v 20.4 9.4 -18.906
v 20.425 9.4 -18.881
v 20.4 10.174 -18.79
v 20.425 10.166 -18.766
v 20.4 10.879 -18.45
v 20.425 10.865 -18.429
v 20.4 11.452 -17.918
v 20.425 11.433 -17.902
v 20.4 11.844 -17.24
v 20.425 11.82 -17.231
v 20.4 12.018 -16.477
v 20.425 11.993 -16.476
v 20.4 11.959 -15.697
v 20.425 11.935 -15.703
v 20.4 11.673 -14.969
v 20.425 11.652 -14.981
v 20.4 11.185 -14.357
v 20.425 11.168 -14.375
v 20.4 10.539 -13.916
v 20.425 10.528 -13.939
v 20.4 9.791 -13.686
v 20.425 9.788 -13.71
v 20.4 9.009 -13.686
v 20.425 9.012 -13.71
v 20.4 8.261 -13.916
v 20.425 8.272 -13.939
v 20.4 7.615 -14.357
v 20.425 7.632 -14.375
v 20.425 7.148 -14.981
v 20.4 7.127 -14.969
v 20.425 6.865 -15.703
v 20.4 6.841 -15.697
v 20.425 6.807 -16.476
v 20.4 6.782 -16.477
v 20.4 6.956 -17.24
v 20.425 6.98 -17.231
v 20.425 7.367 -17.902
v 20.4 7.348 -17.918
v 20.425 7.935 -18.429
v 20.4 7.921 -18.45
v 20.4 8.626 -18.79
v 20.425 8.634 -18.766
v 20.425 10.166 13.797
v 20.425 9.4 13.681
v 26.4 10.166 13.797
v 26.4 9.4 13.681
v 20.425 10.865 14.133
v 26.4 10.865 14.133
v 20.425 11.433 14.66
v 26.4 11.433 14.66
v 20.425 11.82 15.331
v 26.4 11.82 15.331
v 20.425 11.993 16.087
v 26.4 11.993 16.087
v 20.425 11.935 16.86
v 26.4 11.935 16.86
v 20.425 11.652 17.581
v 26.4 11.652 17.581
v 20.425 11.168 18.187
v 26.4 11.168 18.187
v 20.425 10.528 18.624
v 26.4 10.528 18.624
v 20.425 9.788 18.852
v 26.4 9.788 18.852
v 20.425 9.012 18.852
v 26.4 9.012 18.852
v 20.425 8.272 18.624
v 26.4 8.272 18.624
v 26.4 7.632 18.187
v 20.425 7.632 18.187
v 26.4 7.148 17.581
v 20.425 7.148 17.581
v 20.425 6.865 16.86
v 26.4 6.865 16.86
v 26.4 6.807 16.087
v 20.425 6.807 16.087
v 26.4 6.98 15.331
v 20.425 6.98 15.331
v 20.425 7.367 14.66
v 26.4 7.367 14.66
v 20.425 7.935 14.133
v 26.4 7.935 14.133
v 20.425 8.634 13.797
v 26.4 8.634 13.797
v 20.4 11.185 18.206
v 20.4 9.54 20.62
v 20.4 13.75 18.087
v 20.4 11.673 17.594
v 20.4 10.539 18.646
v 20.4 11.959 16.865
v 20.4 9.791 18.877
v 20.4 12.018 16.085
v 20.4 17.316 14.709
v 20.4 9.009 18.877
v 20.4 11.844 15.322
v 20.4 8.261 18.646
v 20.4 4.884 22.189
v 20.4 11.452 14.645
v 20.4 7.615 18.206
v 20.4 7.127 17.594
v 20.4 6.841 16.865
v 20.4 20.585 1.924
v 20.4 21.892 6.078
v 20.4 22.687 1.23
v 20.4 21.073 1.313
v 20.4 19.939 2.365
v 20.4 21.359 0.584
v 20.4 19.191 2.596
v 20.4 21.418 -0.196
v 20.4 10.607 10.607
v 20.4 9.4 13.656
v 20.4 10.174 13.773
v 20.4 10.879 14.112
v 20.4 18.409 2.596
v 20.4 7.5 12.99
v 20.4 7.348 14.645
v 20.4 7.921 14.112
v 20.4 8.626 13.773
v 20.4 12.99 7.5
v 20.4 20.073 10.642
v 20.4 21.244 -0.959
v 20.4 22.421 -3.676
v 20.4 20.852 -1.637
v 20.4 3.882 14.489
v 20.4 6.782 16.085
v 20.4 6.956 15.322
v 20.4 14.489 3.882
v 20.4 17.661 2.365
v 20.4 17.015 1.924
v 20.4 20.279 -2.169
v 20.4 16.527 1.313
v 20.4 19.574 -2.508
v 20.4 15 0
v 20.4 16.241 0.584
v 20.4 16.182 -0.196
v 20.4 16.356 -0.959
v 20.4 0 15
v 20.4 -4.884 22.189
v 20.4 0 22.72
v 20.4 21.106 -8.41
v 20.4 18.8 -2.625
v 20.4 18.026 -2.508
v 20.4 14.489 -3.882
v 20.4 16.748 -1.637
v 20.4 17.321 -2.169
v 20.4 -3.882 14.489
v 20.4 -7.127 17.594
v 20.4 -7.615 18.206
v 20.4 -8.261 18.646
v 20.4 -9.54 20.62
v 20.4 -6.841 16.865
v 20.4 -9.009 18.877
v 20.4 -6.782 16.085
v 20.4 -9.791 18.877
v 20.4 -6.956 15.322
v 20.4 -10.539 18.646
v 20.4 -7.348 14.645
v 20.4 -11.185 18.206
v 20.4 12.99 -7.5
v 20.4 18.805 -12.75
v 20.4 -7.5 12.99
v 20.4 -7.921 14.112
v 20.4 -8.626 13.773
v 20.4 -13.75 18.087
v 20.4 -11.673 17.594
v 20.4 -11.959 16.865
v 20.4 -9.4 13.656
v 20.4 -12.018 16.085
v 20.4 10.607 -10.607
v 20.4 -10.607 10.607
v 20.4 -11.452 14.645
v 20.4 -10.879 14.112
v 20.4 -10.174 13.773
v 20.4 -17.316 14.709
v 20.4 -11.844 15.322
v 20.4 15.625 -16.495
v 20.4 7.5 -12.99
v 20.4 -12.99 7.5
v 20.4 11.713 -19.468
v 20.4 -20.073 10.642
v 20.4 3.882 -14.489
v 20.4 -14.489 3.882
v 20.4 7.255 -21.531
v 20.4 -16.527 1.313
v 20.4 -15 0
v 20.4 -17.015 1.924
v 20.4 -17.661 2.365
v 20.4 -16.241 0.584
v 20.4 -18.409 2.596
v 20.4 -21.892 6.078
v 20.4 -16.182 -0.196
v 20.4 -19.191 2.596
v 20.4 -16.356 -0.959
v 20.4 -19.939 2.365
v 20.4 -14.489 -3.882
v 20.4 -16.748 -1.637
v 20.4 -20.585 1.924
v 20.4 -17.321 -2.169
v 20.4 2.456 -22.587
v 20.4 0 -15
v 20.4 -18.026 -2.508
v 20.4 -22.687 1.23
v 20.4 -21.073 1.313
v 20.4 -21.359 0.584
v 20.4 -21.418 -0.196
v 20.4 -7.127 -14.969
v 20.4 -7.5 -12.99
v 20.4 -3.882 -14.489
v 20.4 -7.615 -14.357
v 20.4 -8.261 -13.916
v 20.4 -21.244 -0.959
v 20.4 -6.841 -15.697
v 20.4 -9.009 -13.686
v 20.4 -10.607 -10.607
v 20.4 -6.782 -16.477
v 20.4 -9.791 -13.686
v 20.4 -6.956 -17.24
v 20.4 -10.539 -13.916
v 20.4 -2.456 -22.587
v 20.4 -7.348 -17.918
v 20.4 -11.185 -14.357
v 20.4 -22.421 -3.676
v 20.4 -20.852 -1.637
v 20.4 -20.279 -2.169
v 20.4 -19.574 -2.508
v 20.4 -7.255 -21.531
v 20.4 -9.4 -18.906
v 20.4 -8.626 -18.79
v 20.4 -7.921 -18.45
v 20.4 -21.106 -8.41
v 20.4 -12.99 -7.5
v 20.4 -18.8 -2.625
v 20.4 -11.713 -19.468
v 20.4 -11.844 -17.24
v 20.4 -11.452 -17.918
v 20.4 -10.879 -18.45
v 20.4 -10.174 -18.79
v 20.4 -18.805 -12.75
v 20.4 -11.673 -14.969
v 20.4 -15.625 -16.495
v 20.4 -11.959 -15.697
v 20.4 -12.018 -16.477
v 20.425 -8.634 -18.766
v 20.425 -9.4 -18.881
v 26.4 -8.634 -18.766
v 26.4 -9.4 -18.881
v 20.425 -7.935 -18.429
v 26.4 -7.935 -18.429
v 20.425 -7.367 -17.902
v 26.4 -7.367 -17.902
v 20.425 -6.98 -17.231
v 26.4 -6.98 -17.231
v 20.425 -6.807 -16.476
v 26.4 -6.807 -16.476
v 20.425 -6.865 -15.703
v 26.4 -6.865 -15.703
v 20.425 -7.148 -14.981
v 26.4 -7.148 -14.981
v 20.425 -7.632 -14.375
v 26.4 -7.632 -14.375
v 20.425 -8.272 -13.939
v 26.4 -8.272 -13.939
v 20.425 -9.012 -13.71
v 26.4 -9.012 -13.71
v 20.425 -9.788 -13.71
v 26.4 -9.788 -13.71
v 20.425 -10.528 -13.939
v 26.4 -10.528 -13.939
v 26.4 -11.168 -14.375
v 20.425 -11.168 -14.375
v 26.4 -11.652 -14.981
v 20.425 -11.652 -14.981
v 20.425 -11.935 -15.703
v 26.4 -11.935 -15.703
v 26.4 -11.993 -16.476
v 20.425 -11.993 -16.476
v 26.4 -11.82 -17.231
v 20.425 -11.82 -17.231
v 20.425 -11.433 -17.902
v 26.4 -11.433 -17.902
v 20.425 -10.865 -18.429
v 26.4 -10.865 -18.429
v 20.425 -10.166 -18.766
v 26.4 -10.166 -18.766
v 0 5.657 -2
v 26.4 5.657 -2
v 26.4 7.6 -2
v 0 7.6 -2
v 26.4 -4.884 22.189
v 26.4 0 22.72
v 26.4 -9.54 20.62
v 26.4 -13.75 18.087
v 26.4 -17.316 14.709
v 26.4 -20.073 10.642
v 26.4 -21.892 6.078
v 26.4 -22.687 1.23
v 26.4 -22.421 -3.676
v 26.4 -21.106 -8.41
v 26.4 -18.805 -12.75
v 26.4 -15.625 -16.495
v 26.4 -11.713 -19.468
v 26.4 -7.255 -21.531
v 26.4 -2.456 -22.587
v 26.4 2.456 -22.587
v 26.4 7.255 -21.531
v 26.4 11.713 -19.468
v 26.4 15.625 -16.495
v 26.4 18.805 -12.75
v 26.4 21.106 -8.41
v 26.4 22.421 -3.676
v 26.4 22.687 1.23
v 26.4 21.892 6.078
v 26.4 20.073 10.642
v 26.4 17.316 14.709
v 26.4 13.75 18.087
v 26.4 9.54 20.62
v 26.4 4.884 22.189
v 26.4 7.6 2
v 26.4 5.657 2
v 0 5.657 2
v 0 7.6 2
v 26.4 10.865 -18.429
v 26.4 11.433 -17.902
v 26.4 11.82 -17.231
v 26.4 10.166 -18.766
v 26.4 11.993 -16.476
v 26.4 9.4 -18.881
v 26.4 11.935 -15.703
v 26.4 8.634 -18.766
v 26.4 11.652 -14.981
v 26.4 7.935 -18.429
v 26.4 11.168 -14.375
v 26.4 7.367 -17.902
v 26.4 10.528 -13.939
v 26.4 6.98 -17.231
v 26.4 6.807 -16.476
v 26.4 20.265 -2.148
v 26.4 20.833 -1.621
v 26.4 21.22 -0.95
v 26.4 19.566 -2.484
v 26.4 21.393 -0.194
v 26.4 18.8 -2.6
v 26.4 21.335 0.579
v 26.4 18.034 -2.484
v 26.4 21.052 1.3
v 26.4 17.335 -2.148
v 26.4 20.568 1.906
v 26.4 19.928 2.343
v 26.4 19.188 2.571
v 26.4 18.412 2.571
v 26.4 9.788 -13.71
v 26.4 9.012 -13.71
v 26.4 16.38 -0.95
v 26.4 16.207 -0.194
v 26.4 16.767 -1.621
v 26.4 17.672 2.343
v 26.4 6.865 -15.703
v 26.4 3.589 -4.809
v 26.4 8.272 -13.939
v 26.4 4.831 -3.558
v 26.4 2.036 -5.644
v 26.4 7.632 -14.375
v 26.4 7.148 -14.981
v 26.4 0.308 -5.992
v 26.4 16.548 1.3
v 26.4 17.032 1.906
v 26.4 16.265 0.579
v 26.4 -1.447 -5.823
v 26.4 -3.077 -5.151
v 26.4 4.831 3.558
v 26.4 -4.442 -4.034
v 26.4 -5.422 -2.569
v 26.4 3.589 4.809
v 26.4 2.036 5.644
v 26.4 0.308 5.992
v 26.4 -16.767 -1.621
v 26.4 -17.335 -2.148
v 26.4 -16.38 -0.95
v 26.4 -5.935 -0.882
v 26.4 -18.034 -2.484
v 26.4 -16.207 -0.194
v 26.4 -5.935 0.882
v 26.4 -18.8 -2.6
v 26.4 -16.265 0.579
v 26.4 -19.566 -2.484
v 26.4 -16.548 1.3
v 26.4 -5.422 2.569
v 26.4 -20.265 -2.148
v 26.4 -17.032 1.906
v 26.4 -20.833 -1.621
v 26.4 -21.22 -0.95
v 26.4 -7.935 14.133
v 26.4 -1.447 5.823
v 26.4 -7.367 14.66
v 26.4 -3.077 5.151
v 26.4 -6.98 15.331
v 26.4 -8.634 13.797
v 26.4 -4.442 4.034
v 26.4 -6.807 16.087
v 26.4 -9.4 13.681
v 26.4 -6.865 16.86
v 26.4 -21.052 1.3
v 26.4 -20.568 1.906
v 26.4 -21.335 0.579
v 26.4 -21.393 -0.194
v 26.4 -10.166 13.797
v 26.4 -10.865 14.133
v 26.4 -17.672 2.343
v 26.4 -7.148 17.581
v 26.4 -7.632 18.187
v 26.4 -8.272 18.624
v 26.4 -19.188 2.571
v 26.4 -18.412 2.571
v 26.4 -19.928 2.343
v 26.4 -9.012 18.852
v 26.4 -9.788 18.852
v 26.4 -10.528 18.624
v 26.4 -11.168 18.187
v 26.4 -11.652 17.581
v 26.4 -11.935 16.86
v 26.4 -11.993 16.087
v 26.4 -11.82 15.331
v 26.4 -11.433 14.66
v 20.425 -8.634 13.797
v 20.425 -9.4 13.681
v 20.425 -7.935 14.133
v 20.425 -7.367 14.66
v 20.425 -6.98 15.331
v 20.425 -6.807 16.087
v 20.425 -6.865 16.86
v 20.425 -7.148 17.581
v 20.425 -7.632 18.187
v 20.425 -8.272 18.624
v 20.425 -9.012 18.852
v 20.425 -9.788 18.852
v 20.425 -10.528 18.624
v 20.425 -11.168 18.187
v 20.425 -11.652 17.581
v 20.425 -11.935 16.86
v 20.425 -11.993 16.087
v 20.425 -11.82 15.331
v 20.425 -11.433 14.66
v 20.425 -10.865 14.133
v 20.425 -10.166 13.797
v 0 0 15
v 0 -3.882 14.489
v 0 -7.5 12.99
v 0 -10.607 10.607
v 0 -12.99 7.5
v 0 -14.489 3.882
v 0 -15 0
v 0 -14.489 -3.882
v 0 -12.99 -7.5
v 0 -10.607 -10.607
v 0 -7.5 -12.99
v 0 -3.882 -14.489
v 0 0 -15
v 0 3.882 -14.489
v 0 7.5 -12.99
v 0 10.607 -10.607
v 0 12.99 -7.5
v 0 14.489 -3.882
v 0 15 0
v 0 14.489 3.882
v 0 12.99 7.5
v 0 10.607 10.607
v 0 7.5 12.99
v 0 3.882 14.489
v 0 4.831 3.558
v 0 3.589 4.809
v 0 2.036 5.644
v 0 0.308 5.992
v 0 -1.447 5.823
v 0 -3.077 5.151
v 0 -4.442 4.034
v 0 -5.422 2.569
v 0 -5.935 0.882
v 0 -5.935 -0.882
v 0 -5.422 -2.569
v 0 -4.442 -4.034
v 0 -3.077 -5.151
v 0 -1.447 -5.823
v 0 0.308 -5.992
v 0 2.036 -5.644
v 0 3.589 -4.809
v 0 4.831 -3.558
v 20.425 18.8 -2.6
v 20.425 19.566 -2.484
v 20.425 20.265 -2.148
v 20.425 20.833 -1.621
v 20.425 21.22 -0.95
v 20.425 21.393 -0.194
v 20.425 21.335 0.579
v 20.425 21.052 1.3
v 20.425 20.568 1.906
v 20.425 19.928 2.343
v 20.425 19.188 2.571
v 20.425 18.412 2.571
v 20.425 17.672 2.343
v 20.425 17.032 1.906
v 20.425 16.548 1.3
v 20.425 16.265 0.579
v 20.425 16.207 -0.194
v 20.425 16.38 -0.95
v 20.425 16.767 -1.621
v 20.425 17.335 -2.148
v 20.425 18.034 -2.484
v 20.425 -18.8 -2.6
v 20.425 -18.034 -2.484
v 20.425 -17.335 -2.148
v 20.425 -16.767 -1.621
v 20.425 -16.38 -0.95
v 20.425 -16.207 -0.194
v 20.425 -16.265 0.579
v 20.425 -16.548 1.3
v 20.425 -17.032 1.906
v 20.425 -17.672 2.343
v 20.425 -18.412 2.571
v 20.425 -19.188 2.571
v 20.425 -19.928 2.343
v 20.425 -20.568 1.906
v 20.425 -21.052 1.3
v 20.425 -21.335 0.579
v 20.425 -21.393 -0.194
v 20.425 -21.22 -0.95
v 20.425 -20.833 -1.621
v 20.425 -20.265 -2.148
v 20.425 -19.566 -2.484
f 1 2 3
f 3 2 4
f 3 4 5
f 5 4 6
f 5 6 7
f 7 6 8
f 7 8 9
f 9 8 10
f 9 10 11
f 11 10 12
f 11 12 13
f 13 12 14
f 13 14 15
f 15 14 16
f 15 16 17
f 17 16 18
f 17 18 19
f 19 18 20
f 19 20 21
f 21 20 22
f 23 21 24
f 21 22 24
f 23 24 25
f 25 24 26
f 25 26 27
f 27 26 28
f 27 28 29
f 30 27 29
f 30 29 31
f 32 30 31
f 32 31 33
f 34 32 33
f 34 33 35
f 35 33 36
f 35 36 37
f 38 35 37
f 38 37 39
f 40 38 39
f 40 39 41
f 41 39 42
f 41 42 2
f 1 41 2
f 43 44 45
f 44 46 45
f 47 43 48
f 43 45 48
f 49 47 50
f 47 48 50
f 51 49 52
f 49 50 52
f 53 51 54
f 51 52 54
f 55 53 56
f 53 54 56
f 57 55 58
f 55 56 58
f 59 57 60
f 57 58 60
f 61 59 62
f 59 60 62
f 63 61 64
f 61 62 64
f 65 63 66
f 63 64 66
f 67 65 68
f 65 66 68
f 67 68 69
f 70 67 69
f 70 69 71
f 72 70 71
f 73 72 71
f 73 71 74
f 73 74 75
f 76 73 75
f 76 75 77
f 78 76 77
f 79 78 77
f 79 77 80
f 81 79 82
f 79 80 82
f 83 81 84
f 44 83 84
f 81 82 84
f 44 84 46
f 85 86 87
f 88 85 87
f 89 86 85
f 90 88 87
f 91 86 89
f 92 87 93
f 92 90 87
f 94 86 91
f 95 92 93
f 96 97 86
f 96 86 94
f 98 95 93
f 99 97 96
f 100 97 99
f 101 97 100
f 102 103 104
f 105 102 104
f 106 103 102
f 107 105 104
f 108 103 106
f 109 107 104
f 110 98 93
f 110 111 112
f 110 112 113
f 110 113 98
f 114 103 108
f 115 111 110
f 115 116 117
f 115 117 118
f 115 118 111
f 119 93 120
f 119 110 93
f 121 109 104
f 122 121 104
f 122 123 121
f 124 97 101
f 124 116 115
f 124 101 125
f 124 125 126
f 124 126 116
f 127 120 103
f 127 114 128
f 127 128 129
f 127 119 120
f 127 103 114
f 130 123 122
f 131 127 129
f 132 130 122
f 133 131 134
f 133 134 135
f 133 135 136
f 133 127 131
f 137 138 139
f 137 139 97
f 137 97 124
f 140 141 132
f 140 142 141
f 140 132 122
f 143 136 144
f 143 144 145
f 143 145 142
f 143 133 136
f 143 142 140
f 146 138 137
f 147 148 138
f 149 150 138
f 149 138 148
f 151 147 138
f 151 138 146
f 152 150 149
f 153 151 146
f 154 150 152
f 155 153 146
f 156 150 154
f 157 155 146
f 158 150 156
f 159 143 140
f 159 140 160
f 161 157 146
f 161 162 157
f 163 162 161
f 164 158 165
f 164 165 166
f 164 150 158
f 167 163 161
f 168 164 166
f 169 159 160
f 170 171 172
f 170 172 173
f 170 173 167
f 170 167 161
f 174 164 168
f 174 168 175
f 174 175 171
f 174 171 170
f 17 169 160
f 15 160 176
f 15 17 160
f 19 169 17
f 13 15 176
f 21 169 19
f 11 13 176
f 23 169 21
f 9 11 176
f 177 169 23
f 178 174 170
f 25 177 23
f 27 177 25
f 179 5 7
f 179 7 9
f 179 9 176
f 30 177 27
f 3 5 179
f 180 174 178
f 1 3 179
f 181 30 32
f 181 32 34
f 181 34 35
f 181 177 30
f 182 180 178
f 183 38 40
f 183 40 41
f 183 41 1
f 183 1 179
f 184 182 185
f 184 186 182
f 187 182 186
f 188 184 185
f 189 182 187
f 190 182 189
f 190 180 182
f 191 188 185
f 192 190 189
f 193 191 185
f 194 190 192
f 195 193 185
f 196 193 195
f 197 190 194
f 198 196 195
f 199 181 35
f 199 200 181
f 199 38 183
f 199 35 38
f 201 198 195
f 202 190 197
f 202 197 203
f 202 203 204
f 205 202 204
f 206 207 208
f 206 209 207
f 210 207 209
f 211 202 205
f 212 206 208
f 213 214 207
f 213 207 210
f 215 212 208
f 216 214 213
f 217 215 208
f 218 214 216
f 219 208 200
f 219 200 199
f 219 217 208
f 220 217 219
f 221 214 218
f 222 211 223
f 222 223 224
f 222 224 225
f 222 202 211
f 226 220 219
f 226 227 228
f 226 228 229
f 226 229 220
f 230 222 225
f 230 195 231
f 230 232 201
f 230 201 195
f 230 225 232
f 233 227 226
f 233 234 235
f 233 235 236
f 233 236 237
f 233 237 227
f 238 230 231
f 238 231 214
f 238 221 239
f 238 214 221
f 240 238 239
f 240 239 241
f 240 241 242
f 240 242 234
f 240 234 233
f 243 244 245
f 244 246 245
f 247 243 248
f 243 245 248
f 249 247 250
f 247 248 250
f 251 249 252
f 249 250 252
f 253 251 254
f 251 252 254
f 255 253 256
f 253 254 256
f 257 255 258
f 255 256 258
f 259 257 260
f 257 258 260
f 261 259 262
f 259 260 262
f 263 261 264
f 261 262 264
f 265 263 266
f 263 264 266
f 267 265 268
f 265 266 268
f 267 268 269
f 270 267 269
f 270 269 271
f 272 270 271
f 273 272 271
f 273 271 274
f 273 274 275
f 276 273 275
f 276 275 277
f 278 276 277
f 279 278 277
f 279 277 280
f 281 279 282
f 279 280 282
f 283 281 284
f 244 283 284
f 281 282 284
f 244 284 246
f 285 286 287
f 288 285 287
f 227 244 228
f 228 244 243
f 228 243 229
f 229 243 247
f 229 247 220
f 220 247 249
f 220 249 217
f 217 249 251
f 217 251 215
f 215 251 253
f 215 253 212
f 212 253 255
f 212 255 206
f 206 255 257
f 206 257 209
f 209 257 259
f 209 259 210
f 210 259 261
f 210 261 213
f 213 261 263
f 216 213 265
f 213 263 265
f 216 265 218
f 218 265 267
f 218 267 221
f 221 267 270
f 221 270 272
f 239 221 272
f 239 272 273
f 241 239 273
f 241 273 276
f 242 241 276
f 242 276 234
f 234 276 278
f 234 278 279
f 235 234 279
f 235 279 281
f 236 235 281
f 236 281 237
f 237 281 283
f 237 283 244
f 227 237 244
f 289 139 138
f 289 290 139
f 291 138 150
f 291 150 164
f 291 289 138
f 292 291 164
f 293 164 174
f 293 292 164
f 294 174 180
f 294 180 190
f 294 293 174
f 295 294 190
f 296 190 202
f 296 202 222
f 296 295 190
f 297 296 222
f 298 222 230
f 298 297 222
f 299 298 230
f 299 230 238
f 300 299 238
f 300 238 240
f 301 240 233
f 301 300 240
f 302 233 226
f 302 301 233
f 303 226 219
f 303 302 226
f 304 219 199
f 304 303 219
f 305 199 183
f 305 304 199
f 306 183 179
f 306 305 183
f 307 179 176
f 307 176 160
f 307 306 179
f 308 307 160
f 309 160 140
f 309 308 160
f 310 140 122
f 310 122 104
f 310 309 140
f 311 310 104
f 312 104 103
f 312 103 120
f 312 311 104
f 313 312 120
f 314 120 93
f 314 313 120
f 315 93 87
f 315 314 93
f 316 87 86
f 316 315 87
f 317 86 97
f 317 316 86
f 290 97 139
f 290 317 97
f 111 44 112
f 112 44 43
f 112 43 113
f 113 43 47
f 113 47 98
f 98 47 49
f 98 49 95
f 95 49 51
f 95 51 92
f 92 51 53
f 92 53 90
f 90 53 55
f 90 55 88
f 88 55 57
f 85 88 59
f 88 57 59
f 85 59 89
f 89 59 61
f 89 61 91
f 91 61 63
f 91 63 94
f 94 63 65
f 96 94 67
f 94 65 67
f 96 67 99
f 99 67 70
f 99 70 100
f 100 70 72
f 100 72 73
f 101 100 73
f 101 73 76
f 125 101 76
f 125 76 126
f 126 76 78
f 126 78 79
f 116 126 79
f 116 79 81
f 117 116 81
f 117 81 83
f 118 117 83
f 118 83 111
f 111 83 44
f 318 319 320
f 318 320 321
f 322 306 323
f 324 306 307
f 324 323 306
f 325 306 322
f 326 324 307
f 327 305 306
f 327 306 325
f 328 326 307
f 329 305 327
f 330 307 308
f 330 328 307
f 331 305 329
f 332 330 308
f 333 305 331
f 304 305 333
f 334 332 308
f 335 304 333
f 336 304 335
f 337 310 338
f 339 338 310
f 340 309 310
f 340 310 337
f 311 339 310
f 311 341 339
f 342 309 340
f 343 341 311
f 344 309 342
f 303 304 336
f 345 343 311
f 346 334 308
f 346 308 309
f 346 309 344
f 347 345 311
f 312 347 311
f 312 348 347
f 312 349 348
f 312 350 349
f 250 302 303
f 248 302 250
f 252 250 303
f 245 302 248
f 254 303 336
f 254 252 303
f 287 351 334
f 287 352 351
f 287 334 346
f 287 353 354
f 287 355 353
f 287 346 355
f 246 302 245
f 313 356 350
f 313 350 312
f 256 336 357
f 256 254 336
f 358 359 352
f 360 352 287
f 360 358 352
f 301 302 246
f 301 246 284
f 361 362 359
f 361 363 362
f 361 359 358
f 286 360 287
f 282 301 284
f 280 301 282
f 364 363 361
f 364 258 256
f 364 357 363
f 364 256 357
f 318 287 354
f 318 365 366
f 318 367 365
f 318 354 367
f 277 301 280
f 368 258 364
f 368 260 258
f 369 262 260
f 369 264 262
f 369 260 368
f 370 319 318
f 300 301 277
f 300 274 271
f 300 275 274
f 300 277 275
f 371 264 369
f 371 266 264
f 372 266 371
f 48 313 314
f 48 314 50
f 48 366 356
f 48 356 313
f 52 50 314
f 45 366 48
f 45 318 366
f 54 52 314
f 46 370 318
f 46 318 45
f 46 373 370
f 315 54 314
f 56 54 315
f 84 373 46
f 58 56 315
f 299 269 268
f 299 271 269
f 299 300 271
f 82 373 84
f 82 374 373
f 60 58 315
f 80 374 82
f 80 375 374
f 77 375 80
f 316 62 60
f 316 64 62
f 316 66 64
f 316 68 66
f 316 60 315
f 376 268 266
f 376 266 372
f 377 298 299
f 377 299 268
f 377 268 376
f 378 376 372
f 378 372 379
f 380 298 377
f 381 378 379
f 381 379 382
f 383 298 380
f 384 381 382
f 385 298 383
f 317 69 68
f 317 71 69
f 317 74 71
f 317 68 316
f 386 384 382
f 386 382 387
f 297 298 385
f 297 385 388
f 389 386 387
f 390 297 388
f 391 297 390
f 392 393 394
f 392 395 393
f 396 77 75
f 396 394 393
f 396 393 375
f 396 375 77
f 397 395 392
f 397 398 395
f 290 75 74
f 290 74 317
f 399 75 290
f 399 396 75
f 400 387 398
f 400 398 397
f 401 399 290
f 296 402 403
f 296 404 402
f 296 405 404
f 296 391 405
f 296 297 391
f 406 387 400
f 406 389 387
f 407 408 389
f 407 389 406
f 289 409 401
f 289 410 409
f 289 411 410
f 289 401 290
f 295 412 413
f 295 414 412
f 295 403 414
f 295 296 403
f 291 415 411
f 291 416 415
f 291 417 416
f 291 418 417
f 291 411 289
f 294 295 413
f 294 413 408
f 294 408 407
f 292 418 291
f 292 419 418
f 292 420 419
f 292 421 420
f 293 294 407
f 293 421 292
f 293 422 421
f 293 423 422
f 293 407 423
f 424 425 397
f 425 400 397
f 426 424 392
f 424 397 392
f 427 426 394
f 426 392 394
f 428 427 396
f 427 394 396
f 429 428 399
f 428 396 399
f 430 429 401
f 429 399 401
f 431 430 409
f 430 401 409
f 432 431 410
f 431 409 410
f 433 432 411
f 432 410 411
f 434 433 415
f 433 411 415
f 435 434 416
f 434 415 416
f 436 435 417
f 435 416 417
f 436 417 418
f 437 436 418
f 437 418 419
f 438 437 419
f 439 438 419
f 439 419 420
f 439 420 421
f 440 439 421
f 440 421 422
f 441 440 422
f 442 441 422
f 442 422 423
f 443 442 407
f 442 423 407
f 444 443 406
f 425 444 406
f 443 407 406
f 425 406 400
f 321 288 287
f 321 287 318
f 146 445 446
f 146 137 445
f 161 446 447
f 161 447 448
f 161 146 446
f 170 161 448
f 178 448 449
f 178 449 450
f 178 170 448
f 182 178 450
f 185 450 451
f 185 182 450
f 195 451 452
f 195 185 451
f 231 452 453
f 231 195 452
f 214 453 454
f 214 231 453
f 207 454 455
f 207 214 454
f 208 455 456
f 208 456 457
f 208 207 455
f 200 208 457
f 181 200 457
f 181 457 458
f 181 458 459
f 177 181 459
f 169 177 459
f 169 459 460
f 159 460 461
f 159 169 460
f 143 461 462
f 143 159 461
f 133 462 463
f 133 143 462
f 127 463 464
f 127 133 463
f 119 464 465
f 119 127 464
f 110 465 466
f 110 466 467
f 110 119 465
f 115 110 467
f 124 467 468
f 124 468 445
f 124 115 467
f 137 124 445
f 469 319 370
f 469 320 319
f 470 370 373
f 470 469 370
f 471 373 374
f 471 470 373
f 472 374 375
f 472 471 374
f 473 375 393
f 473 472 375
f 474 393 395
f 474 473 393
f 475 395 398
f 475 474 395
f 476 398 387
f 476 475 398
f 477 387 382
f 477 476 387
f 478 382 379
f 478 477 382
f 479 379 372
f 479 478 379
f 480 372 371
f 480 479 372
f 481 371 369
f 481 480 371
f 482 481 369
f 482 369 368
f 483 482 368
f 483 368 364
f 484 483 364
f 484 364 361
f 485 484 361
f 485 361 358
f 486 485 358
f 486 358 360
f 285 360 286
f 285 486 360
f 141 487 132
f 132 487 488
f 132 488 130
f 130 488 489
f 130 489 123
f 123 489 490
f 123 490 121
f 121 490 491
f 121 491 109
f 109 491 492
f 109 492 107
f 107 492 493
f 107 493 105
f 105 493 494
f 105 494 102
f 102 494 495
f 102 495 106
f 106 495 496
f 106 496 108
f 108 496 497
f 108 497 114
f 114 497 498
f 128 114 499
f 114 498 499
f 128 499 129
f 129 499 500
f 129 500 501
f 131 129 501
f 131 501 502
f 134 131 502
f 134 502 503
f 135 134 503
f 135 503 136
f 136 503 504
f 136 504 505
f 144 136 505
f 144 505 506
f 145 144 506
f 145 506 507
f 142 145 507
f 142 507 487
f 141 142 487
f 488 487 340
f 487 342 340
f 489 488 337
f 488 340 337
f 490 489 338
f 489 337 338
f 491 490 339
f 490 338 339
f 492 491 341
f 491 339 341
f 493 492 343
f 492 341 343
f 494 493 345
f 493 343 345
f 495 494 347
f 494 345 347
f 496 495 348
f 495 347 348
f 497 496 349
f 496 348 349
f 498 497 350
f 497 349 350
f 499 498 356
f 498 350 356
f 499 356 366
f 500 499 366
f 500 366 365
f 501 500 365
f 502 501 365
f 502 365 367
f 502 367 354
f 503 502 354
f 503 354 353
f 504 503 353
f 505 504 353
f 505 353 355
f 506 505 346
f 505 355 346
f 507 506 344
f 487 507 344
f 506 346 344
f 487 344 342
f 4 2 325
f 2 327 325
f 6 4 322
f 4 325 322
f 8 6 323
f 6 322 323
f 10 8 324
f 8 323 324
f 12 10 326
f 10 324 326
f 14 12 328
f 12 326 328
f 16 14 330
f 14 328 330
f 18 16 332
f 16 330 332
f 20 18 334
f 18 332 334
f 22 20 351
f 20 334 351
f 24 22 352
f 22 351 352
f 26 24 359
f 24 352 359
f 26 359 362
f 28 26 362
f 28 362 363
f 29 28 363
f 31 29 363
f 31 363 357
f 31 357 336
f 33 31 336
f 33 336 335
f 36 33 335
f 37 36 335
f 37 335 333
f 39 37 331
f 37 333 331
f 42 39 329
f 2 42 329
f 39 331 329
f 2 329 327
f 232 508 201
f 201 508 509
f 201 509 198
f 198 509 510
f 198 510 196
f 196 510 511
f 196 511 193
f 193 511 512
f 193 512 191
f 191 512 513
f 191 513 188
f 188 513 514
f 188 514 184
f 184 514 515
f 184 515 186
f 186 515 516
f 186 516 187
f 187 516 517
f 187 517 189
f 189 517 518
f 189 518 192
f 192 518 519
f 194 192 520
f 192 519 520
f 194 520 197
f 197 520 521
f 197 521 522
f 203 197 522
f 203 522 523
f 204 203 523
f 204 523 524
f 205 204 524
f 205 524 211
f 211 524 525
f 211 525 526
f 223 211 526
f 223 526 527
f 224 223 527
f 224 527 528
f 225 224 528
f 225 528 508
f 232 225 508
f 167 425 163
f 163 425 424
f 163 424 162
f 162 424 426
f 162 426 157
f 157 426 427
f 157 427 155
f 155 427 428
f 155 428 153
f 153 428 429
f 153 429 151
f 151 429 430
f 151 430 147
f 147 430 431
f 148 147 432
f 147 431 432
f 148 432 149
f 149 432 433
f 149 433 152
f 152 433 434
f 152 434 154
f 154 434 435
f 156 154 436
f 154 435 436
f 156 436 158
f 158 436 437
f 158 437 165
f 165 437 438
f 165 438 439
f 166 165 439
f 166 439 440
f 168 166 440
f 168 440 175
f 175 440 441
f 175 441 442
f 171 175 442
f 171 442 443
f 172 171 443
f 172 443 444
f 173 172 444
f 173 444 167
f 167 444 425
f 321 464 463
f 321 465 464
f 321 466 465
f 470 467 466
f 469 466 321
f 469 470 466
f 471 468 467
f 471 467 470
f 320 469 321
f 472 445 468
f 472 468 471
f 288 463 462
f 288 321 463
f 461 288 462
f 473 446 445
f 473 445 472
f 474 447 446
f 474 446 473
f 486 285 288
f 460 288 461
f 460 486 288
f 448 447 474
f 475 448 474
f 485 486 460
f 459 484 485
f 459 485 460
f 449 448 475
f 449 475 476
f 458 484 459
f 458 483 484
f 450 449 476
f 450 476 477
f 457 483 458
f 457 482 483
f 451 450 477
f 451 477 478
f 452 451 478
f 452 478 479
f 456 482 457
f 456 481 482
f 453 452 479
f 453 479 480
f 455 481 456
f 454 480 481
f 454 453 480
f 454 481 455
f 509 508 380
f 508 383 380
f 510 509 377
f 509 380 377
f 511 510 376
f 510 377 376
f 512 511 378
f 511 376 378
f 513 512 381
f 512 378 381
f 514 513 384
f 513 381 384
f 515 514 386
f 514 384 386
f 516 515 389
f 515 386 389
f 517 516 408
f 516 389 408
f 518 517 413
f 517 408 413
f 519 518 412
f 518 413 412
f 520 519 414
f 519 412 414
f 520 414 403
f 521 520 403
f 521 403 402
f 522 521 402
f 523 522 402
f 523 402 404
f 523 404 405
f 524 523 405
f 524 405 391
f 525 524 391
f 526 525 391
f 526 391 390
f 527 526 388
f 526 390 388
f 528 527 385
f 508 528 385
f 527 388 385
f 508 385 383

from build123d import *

# Parameters (mm, degrees)
HOLE_WIZARD_5_2_5_2_1_D           = 5.2
HOLE_WIZARD_5_2_5_2_1_CSINK_D     = 5.25
HOLE_WIZARD_5_2_5_2_1_CSINK_ANGLE = 90
SKETCH_4_W                        = 4
SKETCH_4_H                        = 4.736079205
CUT_EXTRUDE_1_DEPTH               = 35


with BuildPart() as part:
    # 草图1 → 旋转1 (revolve)
    with BuildSketch(Plane.XY, mode=Mode.PRIVATE) as revolve_1_sk:
        Polygon((0, 6), (0, 15), (20.4, 15), (20.4, 22.72), (26.4, 22.72), (26.4, 6), align=None)
    revolve(revolve_1_sk.sketch.rotate(Axis((0, 0, 0), (1, 0, 0)), 90), axis=Axis((0, 0, 0), (1, 0, 0)))

    # Ø5.2 (5.2) 直径孔1 (through all)
    with Locations(Plane.ZY.offset(-20.4)):
        with Locations((0, 18.8), (16.281277591, -9.4), (-16.281277591, -9.4), (0, -18.8), (-16.281277591, 9.4), (16.281277591, 9.4)):
            CounterSinkHole(HOLE_WIZARD_5_2_5_2_1_D / 2, HOLE_WIZARD_5_2_5_2_1_CSINK_D / 2, counter_sink_angle=HOLE_WIZARD_5_2_5_2_1_CSINK_ANGLE)

    # 草图4 → 切除-拉伸1 (cut)
    with BuildSketch(Plane.ZY):
        with Locations((0, 5.231960397)):
            Rectangle(SKETCH_4_W, SKETCH_4_H)
    extrude(amount=-CUT_EXTRUDE_1_DEPTH, mode=Mode.SUBTRACT)


solid = part.part
